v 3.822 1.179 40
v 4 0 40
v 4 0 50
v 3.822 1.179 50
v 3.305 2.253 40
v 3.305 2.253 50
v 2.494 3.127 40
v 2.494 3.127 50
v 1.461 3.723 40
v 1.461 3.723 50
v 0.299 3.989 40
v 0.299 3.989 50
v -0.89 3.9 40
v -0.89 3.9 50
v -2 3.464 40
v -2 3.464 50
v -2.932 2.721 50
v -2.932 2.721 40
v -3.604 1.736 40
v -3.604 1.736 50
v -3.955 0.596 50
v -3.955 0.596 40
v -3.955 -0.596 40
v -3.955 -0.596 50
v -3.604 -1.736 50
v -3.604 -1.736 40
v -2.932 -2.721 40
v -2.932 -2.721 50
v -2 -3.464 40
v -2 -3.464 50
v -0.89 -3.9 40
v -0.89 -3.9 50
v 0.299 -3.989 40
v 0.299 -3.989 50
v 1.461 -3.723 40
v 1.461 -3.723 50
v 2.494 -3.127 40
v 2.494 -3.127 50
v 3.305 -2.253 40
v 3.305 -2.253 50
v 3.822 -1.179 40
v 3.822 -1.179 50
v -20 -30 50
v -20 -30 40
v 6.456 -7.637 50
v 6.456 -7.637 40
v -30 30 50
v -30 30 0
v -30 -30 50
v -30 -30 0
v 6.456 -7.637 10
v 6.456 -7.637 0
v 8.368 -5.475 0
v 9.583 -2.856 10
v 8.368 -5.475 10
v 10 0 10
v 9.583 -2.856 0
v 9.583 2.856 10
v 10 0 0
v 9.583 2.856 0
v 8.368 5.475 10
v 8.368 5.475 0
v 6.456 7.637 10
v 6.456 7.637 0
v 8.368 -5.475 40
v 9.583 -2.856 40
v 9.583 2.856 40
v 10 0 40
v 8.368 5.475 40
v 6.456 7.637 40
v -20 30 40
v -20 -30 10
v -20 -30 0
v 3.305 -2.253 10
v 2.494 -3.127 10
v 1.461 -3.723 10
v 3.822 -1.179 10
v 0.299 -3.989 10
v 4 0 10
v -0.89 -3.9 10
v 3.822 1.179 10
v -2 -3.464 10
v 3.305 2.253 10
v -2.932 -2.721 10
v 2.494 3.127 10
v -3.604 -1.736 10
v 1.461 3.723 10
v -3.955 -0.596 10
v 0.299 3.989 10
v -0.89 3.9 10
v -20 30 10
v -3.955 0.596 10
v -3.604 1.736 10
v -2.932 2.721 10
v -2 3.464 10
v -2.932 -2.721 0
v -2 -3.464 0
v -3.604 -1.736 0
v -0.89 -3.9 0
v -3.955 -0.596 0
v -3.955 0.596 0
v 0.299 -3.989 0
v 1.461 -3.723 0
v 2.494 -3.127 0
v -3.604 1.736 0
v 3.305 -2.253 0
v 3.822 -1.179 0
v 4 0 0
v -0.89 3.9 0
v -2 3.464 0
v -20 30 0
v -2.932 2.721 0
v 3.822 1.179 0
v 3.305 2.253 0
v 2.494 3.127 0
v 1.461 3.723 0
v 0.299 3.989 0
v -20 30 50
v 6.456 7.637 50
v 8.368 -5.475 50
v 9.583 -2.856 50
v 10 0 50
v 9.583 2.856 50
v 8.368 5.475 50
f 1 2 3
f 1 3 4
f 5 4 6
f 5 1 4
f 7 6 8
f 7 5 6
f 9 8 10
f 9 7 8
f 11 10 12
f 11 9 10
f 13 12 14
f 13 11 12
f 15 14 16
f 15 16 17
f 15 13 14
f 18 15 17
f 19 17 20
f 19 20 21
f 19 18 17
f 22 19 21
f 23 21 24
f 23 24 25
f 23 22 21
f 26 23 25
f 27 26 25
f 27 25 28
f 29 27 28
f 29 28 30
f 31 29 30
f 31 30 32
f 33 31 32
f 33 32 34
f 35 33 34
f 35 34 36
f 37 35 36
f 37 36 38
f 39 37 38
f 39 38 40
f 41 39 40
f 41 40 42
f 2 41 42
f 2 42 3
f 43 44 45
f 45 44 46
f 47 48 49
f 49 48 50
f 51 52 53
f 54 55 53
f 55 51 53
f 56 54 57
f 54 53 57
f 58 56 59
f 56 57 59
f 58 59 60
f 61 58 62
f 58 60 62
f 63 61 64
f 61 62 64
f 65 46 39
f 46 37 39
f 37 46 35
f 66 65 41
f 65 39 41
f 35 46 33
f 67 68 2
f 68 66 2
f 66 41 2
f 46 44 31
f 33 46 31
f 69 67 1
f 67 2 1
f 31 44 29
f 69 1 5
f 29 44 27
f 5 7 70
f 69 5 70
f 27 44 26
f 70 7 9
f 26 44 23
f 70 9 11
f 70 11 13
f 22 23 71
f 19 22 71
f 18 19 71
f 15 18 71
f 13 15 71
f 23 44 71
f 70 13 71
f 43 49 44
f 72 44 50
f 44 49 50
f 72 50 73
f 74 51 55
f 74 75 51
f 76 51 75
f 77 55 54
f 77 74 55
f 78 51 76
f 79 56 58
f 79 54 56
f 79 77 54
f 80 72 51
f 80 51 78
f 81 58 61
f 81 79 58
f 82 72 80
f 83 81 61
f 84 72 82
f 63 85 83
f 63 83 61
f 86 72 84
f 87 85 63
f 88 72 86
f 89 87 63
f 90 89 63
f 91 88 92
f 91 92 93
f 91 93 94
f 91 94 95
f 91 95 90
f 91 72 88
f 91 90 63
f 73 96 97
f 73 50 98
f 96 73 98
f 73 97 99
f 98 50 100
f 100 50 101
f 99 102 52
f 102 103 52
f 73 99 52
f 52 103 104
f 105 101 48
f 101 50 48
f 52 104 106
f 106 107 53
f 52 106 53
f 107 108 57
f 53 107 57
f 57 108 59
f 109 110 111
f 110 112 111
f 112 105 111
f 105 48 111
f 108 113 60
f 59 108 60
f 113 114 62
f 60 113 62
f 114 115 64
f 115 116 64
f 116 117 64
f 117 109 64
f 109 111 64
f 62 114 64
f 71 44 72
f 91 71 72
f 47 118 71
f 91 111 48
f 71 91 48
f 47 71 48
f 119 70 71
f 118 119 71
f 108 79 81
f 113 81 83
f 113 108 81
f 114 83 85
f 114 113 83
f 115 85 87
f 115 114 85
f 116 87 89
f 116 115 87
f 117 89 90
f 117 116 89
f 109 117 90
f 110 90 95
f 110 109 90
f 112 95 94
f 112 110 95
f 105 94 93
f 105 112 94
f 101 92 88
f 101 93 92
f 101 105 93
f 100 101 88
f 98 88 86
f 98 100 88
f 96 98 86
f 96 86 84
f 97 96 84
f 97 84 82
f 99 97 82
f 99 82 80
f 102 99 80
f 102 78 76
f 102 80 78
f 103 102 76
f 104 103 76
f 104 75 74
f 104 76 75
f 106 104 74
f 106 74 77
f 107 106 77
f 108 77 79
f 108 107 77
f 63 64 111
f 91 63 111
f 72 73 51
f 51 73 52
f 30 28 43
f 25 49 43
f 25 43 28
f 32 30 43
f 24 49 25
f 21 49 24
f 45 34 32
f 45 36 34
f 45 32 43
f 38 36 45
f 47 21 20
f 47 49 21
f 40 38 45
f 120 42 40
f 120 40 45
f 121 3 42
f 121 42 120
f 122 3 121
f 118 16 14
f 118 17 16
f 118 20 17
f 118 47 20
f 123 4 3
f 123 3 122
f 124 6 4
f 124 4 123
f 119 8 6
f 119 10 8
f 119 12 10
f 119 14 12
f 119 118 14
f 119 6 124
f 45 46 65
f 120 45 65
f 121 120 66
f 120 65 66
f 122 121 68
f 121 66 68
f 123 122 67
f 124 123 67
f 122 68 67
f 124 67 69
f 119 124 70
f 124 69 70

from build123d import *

# Parameters (mm, degrees)
SKETCH1_R               = 4
BOSS_EXTRUDE1_DEPTH     = 50
CUT_EXTRUDE1_DEPTH      = 40
CUT_EXTRUDE1_DEPTH_BACK = 20
SKETCH2_W               = 30
SKETCH2_H               = 60


with BuildPart() as part:
    # Sketch1 → Boss-Extrude1 (new body)
    with BuildSketch(Plane.XY):
        with BuildLine():
            ThreePointArc((6.455619112, -7.637079408), (10, 0), (6.455619112, 7.637079408))
            Line((6.455619112, 7.637079408), (-20, 30))
            Line((-20, 30), (-30, 30))
            Line((-30, 30), (-30, -30))
            Line((-30, -30), (-20, -30))
            Line((-20, -30), (6.455619112, -7.637079408))
        make_face()
        Circle(SKETCH1_R, mode=Mode.SUBTRACT)
    extrude(amount=BOSS_EXTRUDE1_DEPTH)

    # Sketch2 → Cut-Extrude1 (cut, two sides: drawn at the far end of the back side and taken through both)
    with BuildSketch(Plane(origin=(0, 0, 0), x_dir=(0, 0, -1), z_dir=(1, 0, 0)).offset(-CUT_EXTRUDE1_DEPTH_BACK)):
        with Locations((-25, 0)):
            Rectangle(SKETCH2_W, SKETCH2_H)
    extrude(amount=CUT_EXTRUDE1_DEPTH + CUT_EXTRUDE1_DEPTH_BACK, mode=Mode.SUBTRACT)


solid = part.part
